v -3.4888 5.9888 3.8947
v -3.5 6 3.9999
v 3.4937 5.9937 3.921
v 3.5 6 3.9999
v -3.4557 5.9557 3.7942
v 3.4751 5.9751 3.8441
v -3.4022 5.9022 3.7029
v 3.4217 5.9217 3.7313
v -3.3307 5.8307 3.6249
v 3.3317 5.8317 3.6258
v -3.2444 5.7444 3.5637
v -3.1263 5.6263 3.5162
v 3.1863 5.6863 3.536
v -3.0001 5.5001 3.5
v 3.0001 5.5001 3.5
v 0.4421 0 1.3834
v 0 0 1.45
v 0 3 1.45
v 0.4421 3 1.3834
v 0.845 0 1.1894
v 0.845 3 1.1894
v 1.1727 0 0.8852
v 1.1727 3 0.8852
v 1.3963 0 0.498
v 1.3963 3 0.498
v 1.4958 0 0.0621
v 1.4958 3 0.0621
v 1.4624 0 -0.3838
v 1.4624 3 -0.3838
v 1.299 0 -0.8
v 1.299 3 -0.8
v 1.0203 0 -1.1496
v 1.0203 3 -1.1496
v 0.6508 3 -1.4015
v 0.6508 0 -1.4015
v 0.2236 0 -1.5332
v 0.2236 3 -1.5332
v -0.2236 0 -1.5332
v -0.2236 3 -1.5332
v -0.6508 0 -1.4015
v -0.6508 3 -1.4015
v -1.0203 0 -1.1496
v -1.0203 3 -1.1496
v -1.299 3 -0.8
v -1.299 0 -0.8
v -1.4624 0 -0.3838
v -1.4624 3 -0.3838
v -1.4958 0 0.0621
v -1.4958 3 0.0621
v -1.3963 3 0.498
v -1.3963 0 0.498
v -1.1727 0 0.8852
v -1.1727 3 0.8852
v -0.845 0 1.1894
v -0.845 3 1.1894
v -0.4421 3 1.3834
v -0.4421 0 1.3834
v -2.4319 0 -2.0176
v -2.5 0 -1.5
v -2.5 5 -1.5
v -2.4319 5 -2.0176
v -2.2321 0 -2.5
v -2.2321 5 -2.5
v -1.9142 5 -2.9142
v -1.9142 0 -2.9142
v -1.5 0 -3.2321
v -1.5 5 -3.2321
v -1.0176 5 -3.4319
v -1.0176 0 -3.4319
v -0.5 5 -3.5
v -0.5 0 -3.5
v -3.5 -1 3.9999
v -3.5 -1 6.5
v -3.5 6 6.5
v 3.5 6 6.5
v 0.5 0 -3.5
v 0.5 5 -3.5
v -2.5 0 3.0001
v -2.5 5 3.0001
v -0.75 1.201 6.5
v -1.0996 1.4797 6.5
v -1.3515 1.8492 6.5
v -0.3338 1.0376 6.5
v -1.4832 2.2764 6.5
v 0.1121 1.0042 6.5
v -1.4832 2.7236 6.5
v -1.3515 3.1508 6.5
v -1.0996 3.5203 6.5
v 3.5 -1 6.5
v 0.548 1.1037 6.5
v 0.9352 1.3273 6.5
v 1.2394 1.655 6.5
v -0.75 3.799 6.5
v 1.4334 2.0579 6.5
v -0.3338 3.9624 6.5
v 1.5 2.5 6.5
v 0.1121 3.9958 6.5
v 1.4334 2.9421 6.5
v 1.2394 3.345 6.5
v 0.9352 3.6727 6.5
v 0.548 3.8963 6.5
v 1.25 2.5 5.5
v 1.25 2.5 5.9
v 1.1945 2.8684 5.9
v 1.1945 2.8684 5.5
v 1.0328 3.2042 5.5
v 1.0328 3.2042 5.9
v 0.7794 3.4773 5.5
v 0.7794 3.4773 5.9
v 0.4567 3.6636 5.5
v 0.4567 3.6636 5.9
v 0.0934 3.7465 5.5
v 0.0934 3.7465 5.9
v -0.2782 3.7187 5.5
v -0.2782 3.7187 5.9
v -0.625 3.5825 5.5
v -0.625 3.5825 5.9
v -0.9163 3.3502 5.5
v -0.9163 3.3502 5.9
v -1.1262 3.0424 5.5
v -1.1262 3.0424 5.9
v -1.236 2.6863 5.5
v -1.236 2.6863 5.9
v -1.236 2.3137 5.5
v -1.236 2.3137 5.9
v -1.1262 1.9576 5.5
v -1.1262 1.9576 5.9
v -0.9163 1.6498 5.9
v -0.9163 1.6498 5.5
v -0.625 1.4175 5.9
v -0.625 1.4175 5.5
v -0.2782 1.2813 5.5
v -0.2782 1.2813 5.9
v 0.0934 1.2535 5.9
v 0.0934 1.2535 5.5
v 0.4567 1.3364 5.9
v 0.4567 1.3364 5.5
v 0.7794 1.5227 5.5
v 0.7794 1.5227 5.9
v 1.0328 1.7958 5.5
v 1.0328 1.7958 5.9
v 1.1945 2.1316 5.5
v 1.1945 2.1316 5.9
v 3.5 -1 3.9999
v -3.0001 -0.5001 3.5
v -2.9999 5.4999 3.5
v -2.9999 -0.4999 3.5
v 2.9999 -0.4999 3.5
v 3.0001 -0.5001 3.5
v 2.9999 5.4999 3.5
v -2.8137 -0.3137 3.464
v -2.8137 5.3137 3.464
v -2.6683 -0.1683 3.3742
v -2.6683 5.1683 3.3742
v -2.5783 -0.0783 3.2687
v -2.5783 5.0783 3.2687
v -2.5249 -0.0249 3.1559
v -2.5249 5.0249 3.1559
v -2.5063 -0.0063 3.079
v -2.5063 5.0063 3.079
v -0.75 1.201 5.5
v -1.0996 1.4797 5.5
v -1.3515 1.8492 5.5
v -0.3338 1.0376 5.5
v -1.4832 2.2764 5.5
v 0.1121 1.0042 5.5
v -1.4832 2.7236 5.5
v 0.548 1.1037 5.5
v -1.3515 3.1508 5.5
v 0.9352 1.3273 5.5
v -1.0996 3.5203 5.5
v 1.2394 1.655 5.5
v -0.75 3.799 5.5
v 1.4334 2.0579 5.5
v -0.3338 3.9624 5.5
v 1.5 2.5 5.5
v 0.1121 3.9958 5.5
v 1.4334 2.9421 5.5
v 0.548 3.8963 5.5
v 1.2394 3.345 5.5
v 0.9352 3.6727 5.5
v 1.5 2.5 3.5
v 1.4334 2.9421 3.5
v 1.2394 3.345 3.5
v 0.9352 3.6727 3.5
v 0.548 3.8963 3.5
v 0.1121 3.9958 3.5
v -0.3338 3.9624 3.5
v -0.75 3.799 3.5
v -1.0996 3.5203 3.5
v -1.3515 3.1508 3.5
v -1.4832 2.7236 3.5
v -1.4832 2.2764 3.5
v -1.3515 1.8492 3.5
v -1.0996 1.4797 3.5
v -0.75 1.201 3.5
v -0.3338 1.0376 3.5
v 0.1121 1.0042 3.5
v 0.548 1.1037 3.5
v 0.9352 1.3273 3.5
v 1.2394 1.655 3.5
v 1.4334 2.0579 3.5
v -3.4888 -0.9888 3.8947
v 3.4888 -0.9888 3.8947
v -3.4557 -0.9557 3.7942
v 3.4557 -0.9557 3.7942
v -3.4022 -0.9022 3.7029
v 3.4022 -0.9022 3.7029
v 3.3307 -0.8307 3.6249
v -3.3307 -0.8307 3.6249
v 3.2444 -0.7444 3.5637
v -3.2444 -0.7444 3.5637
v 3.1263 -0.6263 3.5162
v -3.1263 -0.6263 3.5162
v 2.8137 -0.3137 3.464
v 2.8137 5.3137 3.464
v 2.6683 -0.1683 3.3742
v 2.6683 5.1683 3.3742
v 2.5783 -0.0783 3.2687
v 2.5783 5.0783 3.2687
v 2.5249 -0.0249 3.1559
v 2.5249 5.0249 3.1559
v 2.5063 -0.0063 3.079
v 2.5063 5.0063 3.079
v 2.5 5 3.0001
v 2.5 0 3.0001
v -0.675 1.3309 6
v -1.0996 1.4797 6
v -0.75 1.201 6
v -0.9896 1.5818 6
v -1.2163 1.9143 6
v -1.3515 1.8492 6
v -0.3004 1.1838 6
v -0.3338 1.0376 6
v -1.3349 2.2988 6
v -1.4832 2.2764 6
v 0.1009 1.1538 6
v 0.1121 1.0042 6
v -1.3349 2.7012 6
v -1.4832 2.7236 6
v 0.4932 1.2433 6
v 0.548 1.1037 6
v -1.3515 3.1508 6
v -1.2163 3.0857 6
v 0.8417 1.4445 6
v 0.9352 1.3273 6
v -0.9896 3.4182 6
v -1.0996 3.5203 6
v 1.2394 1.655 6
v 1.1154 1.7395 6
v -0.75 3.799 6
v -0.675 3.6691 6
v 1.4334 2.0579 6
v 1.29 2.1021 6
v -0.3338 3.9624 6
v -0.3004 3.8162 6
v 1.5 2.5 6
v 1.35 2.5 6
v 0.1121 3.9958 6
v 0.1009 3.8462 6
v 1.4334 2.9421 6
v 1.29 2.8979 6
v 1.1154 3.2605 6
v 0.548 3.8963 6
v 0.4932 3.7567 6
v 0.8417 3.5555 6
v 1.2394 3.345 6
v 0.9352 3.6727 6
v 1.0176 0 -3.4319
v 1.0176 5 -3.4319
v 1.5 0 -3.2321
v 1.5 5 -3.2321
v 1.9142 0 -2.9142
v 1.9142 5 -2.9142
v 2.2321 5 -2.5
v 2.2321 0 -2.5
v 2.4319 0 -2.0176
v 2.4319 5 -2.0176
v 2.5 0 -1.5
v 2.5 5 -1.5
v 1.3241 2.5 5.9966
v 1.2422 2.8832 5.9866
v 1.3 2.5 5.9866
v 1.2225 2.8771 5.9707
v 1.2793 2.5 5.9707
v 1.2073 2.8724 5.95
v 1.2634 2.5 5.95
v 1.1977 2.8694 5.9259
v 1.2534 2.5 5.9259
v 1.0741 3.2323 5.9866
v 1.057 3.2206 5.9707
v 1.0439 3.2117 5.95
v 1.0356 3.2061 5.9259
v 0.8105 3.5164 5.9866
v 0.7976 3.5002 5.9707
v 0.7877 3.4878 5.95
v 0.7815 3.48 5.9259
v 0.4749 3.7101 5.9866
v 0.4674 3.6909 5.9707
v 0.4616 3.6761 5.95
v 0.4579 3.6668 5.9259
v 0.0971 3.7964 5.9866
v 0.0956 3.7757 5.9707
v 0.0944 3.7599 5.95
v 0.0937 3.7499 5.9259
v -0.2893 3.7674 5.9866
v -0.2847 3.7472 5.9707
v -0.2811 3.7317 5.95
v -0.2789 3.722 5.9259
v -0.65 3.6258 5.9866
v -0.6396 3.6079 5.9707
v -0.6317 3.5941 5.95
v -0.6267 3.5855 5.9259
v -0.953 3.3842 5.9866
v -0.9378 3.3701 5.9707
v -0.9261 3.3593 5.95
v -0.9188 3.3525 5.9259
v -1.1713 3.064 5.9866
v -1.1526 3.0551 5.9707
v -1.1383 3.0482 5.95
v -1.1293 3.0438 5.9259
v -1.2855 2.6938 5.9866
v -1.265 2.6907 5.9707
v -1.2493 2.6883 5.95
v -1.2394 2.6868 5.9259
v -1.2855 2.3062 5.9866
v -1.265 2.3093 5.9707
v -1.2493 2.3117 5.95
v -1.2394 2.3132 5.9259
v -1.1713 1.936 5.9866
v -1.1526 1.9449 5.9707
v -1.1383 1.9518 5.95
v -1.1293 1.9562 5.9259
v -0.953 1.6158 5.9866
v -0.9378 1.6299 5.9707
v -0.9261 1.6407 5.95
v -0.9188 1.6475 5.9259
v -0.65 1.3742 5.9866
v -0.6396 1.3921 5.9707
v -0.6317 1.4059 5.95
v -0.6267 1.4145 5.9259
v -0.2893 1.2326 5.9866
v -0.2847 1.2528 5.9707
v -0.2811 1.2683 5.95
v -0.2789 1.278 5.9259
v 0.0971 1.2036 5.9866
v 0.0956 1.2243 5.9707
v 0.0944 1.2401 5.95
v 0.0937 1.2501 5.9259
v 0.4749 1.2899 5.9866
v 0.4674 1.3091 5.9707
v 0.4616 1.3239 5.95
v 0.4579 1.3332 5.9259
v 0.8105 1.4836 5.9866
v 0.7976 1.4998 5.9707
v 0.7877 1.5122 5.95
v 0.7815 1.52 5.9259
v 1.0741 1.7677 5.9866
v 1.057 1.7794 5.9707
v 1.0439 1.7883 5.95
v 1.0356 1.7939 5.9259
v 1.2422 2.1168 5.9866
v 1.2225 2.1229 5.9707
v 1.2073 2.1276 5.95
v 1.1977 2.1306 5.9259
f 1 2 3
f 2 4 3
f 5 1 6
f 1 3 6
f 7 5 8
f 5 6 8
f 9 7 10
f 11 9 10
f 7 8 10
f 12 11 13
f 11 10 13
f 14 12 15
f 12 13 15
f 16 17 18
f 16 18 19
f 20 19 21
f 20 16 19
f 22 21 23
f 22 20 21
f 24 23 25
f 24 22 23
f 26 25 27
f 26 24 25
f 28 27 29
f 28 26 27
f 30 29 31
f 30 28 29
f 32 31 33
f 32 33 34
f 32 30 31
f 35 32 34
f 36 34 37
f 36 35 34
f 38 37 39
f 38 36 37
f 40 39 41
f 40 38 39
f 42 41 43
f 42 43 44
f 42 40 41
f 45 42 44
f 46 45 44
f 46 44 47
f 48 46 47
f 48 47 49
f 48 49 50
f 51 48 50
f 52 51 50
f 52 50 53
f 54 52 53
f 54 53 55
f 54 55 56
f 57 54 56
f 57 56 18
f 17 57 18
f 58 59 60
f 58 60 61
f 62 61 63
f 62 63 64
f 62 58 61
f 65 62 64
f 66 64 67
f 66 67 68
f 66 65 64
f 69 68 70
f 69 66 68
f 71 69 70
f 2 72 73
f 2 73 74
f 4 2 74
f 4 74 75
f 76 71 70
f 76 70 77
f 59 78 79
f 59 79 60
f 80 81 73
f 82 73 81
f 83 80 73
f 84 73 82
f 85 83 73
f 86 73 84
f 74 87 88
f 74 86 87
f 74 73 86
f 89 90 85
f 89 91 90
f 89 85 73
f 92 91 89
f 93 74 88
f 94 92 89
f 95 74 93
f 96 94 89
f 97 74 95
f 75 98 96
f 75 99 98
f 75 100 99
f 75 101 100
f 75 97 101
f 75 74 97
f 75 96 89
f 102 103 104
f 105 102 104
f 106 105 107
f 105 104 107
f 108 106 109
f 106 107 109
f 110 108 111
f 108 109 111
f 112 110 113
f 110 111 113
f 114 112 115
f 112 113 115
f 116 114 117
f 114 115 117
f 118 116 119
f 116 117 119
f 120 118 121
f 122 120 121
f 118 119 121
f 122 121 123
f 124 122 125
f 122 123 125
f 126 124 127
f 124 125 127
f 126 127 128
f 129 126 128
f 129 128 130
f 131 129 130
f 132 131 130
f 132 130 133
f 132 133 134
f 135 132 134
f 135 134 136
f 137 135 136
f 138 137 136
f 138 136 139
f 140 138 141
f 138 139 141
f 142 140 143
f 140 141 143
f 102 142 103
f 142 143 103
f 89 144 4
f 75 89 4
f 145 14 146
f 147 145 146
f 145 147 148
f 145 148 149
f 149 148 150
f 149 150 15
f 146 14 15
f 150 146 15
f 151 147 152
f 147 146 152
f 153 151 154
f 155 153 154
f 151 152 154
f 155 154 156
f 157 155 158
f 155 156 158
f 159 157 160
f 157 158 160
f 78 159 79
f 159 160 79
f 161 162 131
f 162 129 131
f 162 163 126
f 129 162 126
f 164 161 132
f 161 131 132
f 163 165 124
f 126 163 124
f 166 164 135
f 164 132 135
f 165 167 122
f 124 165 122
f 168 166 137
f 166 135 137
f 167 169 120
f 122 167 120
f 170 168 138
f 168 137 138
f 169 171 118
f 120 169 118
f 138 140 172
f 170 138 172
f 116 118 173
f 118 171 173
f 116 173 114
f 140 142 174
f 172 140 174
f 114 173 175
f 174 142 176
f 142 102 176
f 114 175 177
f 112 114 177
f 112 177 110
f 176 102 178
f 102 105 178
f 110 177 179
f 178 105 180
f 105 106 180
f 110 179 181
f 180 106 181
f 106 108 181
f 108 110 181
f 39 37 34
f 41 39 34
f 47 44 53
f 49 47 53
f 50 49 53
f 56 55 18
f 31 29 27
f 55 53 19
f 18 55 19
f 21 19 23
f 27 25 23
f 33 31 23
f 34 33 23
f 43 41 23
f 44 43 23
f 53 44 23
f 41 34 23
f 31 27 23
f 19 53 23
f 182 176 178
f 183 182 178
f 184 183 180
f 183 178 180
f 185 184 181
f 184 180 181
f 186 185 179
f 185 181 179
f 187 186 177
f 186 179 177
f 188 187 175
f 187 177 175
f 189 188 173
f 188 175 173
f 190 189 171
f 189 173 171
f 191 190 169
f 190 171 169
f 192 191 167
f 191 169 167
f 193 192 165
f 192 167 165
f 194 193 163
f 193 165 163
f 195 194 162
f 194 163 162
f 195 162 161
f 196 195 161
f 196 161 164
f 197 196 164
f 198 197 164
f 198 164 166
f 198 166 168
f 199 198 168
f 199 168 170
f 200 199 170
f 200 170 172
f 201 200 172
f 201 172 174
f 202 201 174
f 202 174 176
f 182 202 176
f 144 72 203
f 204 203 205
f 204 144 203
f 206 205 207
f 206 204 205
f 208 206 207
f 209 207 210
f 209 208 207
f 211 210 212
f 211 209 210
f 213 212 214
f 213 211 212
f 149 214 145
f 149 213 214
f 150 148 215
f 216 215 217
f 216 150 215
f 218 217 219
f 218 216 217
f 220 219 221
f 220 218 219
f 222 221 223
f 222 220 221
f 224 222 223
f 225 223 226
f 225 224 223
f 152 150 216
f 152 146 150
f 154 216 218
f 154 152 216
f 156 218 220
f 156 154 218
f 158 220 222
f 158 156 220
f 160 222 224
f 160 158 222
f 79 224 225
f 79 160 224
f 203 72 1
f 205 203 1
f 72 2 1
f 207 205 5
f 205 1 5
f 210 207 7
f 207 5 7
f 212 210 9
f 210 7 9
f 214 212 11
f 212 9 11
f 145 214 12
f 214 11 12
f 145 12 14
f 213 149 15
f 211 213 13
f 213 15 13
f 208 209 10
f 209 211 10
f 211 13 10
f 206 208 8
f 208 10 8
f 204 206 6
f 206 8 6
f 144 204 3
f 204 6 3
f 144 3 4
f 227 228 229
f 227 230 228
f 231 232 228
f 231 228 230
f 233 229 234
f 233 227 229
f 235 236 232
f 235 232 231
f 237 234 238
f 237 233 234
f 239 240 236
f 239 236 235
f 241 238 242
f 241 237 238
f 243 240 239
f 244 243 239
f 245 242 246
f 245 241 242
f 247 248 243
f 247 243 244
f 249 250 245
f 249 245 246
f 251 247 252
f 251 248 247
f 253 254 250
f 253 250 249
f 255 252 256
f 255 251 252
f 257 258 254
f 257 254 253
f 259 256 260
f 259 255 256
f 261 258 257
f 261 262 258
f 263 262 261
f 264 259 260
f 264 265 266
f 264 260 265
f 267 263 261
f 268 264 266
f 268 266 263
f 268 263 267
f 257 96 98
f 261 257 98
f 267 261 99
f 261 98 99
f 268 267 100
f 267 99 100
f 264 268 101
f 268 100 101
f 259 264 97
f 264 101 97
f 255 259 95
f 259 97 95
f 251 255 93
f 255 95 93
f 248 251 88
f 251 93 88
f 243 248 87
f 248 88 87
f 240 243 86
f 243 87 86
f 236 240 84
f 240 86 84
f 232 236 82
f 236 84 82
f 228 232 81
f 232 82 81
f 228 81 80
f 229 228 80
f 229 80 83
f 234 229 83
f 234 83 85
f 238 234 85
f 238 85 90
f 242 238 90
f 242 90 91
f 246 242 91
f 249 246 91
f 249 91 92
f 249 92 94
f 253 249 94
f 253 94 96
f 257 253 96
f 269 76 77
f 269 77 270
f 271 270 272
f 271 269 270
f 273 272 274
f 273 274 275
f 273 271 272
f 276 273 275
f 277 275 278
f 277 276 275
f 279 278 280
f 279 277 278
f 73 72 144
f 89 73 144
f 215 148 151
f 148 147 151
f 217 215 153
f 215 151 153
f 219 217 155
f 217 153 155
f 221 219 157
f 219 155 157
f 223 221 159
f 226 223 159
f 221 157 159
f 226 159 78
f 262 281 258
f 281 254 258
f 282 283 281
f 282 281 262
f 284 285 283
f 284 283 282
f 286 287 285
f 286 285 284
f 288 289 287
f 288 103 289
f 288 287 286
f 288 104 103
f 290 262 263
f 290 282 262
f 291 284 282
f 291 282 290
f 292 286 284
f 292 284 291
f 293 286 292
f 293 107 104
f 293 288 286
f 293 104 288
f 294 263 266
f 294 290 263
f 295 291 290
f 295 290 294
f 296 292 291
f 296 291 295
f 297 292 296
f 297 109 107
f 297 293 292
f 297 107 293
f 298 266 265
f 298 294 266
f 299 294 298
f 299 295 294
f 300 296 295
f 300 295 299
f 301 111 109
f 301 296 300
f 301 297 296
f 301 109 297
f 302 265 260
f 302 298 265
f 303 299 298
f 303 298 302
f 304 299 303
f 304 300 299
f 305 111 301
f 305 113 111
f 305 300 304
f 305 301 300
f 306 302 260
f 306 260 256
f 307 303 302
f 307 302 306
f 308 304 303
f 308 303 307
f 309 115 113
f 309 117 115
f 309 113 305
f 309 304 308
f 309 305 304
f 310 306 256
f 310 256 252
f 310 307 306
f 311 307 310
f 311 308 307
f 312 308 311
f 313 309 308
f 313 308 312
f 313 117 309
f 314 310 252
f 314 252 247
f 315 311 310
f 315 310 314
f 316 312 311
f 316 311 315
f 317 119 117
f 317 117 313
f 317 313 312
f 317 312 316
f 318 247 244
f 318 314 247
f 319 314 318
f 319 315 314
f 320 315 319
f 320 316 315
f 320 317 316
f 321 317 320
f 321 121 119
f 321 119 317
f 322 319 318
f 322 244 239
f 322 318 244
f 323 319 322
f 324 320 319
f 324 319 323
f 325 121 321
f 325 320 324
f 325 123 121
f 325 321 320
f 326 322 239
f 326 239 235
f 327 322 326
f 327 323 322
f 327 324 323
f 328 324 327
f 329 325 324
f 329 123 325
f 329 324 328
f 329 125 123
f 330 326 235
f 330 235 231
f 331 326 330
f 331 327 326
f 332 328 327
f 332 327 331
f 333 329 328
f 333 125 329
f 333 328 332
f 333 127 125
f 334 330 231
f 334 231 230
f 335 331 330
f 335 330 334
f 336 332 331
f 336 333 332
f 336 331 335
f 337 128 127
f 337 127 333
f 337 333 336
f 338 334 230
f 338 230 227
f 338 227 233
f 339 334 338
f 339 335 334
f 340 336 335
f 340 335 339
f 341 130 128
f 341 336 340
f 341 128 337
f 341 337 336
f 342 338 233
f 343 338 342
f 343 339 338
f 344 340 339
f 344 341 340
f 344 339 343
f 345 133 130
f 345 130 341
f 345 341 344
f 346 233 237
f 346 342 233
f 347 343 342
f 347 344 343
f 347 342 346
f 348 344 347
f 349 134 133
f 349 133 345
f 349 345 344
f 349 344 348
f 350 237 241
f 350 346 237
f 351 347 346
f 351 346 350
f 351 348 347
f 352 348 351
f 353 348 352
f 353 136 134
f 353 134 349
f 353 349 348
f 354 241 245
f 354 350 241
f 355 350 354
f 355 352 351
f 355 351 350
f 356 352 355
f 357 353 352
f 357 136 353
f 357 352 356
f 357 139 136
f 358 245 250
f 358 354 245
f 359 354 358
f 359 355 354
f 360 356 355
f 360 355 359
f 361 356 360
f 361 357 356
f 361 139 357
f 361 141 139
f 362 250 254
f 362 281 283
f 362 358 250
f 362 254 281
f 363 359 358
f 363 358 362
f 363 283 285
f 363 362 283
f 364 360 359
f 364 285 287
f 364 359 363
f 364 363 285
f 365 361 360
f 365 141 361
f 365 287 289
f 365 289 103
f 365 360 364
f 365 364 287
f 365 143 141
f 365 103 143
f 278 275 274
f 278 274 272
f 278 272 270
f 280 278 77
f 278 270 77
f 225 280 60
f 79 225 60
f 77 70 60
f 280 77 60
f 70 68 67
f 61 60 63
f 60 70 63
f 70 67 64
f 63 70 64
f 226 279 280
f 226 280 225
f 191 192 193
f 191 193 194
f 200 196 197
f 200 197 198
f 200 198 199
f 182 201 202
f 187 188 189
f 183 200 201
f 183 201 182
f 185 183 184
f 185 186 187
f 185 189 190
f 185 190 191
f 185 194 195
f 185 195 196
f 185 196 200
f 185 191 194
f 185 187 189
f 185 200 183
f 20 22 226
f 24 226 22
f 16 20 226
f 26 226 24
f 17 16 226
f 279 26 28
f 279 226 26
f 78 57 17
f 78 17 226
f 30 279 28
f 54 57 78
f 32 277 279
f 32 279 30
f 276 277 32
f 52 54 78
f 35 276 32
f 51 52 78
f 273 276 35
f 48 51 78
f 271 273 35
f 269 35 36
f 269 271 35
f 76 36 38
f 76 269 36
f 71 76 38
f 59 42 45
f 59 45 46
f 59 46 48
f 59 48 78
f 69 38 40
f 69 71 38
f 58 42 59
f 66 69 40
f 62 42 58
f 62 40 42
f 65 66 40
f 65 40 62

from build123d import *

# Parameters (mm, degrees)
ESQUISSE4_R             = 1.5
BOSS_EXTRU_2_DEPTH      = 5
BOSS_EXTRU_3_START      = -2
ESQUISSE5_R             = 1.5
BOSS_EXTRU_3_DEPTH      = 2
ESQUISSE6_W             = 7
ESQUISSE6_H             = 7
BOSS_EXTRU_4_DEPTH      = 3
CONG_1_R                = 0.5
ESQUISSE7_R             = 1.5
ENL_V_MAT_EXTRU_1_DEPTH = 3
BOSS_EXTRU_5_START      = -0.5
ESQUISSE8_R             = 1.5
ESQUISSE8_R_2           = 1.25
BOSS_EXTRU_5_DEPTH      = 0.5
CONG_2_R                = 0.1


with BuildPart() as part:
    # Esquisse4 → Boss.-Extru.2 (new body)
    with BuildSketch(Plane(origin=(0, 0, 0), x_dir=(1, 0, 0), z_dir=(0, 1, 0))):
        with BuildLine():
            Line((-0.5, 3.5), (0.5, 3.5))
            ThreePointArc((0.5, 3.5), (1.914213562, 2.914213562), (2.5, 1.5))
            Line((2.5, 1.5), (2.5, -3.5))
            Line((2.5, -3.5), (-2.5, -3.5))
            Line((-2.5, -3.5), (-2.5, 1.5))
            ThreePointArc((-2.5, 1.5), (-1.914213562, 2.914213562), (-0.5, 3.5))
        make_face()
        with Locations(Location((0, 0.05, 0), (0, 0, 270))):
            Circle(ESQUISSE4_R, mode=Mode.SUBTRACT)
    extrude(amount=BOSS_EXTRU_2_DEPTH)

    # Esquisse5 → Boss.-Extru.3 (add)
    with BuildSketch(Plane(origin=(0, 5, 0), x_dir=(1, 0, 0), z_dir=(0, 1, 0)).offset(BOSS_EXTRU_3_START)):
        with Locations(Location((0, 0.05, 0), (0, 0, 270))):
            Circle(ESQUISSE5_R)
    extrude(amount=BOSS_EXTRU_3_DEPTH)

    # Esquisse6 → Boss.-Extru.4 (add)
    with BuildSketch(Plane.XY.offset(3.5)):
        with Locations((0, 2.5)):
            Rectangle(ESQUISSE6_W, ESQUISSE6_H)
    extrude(amount=BOSS_EXTRU_4_DEPTH)

    # Congé1
    cong_1_edges = [part.edges().sort_by_distance(p)[0] for p in [
        (2.5, 2.5, 3.5),
        (-2.5, 2.5, 3.5),
        (0, 5, 3.5),
        (-3.5, 2.5, 3.5),
        (0, -1, 3.5),
        (3.5, 2.5, 3.5),
        (0, 6, 3.5),
        (0, 0, 3.5),
    ]]
    fillet(cong_1_edges, radius=CONG_1_R - 0.0001)  # a hair under: the kernel refuses the full size

    # Esquisse7 → Enlèv. mat.-Extru.1 (cut)
    with BuildSketch(Plane.XY.offset(6.5)):
        with Locations((0, 2.5)):
            Circle(ESQUISSE7_R)
    extrude(amount=-ENL_V_MAT_EXTRU_1_DEPTH, mode=Mode.SUBTRACT)

    # Esquisse8 → Boss.-Extru.5 (add)
    with BuildSketch(Plane.XY.offset(6.5).offset(BOSS_EXTRU_5_START)):
        with Locations((0, 2.5)):
            Circle(ESQUISSE8_R)
        with Locations((0, 2.5)):
            Circle(ESQUISSE8_R_2, mode=Mode.SUBTRACT)
    extrude(amount=-BOSS_EXTRU_5_DEPTH)

    # Congé2
    cong_2_edges = [part.edges().sort_by_distance(p)[0] for p in [
        (-1.25, 2.5, 6),
    ]]
    fillet(cong_2_edges, radius=CONG_2_R)


solid = part.part
